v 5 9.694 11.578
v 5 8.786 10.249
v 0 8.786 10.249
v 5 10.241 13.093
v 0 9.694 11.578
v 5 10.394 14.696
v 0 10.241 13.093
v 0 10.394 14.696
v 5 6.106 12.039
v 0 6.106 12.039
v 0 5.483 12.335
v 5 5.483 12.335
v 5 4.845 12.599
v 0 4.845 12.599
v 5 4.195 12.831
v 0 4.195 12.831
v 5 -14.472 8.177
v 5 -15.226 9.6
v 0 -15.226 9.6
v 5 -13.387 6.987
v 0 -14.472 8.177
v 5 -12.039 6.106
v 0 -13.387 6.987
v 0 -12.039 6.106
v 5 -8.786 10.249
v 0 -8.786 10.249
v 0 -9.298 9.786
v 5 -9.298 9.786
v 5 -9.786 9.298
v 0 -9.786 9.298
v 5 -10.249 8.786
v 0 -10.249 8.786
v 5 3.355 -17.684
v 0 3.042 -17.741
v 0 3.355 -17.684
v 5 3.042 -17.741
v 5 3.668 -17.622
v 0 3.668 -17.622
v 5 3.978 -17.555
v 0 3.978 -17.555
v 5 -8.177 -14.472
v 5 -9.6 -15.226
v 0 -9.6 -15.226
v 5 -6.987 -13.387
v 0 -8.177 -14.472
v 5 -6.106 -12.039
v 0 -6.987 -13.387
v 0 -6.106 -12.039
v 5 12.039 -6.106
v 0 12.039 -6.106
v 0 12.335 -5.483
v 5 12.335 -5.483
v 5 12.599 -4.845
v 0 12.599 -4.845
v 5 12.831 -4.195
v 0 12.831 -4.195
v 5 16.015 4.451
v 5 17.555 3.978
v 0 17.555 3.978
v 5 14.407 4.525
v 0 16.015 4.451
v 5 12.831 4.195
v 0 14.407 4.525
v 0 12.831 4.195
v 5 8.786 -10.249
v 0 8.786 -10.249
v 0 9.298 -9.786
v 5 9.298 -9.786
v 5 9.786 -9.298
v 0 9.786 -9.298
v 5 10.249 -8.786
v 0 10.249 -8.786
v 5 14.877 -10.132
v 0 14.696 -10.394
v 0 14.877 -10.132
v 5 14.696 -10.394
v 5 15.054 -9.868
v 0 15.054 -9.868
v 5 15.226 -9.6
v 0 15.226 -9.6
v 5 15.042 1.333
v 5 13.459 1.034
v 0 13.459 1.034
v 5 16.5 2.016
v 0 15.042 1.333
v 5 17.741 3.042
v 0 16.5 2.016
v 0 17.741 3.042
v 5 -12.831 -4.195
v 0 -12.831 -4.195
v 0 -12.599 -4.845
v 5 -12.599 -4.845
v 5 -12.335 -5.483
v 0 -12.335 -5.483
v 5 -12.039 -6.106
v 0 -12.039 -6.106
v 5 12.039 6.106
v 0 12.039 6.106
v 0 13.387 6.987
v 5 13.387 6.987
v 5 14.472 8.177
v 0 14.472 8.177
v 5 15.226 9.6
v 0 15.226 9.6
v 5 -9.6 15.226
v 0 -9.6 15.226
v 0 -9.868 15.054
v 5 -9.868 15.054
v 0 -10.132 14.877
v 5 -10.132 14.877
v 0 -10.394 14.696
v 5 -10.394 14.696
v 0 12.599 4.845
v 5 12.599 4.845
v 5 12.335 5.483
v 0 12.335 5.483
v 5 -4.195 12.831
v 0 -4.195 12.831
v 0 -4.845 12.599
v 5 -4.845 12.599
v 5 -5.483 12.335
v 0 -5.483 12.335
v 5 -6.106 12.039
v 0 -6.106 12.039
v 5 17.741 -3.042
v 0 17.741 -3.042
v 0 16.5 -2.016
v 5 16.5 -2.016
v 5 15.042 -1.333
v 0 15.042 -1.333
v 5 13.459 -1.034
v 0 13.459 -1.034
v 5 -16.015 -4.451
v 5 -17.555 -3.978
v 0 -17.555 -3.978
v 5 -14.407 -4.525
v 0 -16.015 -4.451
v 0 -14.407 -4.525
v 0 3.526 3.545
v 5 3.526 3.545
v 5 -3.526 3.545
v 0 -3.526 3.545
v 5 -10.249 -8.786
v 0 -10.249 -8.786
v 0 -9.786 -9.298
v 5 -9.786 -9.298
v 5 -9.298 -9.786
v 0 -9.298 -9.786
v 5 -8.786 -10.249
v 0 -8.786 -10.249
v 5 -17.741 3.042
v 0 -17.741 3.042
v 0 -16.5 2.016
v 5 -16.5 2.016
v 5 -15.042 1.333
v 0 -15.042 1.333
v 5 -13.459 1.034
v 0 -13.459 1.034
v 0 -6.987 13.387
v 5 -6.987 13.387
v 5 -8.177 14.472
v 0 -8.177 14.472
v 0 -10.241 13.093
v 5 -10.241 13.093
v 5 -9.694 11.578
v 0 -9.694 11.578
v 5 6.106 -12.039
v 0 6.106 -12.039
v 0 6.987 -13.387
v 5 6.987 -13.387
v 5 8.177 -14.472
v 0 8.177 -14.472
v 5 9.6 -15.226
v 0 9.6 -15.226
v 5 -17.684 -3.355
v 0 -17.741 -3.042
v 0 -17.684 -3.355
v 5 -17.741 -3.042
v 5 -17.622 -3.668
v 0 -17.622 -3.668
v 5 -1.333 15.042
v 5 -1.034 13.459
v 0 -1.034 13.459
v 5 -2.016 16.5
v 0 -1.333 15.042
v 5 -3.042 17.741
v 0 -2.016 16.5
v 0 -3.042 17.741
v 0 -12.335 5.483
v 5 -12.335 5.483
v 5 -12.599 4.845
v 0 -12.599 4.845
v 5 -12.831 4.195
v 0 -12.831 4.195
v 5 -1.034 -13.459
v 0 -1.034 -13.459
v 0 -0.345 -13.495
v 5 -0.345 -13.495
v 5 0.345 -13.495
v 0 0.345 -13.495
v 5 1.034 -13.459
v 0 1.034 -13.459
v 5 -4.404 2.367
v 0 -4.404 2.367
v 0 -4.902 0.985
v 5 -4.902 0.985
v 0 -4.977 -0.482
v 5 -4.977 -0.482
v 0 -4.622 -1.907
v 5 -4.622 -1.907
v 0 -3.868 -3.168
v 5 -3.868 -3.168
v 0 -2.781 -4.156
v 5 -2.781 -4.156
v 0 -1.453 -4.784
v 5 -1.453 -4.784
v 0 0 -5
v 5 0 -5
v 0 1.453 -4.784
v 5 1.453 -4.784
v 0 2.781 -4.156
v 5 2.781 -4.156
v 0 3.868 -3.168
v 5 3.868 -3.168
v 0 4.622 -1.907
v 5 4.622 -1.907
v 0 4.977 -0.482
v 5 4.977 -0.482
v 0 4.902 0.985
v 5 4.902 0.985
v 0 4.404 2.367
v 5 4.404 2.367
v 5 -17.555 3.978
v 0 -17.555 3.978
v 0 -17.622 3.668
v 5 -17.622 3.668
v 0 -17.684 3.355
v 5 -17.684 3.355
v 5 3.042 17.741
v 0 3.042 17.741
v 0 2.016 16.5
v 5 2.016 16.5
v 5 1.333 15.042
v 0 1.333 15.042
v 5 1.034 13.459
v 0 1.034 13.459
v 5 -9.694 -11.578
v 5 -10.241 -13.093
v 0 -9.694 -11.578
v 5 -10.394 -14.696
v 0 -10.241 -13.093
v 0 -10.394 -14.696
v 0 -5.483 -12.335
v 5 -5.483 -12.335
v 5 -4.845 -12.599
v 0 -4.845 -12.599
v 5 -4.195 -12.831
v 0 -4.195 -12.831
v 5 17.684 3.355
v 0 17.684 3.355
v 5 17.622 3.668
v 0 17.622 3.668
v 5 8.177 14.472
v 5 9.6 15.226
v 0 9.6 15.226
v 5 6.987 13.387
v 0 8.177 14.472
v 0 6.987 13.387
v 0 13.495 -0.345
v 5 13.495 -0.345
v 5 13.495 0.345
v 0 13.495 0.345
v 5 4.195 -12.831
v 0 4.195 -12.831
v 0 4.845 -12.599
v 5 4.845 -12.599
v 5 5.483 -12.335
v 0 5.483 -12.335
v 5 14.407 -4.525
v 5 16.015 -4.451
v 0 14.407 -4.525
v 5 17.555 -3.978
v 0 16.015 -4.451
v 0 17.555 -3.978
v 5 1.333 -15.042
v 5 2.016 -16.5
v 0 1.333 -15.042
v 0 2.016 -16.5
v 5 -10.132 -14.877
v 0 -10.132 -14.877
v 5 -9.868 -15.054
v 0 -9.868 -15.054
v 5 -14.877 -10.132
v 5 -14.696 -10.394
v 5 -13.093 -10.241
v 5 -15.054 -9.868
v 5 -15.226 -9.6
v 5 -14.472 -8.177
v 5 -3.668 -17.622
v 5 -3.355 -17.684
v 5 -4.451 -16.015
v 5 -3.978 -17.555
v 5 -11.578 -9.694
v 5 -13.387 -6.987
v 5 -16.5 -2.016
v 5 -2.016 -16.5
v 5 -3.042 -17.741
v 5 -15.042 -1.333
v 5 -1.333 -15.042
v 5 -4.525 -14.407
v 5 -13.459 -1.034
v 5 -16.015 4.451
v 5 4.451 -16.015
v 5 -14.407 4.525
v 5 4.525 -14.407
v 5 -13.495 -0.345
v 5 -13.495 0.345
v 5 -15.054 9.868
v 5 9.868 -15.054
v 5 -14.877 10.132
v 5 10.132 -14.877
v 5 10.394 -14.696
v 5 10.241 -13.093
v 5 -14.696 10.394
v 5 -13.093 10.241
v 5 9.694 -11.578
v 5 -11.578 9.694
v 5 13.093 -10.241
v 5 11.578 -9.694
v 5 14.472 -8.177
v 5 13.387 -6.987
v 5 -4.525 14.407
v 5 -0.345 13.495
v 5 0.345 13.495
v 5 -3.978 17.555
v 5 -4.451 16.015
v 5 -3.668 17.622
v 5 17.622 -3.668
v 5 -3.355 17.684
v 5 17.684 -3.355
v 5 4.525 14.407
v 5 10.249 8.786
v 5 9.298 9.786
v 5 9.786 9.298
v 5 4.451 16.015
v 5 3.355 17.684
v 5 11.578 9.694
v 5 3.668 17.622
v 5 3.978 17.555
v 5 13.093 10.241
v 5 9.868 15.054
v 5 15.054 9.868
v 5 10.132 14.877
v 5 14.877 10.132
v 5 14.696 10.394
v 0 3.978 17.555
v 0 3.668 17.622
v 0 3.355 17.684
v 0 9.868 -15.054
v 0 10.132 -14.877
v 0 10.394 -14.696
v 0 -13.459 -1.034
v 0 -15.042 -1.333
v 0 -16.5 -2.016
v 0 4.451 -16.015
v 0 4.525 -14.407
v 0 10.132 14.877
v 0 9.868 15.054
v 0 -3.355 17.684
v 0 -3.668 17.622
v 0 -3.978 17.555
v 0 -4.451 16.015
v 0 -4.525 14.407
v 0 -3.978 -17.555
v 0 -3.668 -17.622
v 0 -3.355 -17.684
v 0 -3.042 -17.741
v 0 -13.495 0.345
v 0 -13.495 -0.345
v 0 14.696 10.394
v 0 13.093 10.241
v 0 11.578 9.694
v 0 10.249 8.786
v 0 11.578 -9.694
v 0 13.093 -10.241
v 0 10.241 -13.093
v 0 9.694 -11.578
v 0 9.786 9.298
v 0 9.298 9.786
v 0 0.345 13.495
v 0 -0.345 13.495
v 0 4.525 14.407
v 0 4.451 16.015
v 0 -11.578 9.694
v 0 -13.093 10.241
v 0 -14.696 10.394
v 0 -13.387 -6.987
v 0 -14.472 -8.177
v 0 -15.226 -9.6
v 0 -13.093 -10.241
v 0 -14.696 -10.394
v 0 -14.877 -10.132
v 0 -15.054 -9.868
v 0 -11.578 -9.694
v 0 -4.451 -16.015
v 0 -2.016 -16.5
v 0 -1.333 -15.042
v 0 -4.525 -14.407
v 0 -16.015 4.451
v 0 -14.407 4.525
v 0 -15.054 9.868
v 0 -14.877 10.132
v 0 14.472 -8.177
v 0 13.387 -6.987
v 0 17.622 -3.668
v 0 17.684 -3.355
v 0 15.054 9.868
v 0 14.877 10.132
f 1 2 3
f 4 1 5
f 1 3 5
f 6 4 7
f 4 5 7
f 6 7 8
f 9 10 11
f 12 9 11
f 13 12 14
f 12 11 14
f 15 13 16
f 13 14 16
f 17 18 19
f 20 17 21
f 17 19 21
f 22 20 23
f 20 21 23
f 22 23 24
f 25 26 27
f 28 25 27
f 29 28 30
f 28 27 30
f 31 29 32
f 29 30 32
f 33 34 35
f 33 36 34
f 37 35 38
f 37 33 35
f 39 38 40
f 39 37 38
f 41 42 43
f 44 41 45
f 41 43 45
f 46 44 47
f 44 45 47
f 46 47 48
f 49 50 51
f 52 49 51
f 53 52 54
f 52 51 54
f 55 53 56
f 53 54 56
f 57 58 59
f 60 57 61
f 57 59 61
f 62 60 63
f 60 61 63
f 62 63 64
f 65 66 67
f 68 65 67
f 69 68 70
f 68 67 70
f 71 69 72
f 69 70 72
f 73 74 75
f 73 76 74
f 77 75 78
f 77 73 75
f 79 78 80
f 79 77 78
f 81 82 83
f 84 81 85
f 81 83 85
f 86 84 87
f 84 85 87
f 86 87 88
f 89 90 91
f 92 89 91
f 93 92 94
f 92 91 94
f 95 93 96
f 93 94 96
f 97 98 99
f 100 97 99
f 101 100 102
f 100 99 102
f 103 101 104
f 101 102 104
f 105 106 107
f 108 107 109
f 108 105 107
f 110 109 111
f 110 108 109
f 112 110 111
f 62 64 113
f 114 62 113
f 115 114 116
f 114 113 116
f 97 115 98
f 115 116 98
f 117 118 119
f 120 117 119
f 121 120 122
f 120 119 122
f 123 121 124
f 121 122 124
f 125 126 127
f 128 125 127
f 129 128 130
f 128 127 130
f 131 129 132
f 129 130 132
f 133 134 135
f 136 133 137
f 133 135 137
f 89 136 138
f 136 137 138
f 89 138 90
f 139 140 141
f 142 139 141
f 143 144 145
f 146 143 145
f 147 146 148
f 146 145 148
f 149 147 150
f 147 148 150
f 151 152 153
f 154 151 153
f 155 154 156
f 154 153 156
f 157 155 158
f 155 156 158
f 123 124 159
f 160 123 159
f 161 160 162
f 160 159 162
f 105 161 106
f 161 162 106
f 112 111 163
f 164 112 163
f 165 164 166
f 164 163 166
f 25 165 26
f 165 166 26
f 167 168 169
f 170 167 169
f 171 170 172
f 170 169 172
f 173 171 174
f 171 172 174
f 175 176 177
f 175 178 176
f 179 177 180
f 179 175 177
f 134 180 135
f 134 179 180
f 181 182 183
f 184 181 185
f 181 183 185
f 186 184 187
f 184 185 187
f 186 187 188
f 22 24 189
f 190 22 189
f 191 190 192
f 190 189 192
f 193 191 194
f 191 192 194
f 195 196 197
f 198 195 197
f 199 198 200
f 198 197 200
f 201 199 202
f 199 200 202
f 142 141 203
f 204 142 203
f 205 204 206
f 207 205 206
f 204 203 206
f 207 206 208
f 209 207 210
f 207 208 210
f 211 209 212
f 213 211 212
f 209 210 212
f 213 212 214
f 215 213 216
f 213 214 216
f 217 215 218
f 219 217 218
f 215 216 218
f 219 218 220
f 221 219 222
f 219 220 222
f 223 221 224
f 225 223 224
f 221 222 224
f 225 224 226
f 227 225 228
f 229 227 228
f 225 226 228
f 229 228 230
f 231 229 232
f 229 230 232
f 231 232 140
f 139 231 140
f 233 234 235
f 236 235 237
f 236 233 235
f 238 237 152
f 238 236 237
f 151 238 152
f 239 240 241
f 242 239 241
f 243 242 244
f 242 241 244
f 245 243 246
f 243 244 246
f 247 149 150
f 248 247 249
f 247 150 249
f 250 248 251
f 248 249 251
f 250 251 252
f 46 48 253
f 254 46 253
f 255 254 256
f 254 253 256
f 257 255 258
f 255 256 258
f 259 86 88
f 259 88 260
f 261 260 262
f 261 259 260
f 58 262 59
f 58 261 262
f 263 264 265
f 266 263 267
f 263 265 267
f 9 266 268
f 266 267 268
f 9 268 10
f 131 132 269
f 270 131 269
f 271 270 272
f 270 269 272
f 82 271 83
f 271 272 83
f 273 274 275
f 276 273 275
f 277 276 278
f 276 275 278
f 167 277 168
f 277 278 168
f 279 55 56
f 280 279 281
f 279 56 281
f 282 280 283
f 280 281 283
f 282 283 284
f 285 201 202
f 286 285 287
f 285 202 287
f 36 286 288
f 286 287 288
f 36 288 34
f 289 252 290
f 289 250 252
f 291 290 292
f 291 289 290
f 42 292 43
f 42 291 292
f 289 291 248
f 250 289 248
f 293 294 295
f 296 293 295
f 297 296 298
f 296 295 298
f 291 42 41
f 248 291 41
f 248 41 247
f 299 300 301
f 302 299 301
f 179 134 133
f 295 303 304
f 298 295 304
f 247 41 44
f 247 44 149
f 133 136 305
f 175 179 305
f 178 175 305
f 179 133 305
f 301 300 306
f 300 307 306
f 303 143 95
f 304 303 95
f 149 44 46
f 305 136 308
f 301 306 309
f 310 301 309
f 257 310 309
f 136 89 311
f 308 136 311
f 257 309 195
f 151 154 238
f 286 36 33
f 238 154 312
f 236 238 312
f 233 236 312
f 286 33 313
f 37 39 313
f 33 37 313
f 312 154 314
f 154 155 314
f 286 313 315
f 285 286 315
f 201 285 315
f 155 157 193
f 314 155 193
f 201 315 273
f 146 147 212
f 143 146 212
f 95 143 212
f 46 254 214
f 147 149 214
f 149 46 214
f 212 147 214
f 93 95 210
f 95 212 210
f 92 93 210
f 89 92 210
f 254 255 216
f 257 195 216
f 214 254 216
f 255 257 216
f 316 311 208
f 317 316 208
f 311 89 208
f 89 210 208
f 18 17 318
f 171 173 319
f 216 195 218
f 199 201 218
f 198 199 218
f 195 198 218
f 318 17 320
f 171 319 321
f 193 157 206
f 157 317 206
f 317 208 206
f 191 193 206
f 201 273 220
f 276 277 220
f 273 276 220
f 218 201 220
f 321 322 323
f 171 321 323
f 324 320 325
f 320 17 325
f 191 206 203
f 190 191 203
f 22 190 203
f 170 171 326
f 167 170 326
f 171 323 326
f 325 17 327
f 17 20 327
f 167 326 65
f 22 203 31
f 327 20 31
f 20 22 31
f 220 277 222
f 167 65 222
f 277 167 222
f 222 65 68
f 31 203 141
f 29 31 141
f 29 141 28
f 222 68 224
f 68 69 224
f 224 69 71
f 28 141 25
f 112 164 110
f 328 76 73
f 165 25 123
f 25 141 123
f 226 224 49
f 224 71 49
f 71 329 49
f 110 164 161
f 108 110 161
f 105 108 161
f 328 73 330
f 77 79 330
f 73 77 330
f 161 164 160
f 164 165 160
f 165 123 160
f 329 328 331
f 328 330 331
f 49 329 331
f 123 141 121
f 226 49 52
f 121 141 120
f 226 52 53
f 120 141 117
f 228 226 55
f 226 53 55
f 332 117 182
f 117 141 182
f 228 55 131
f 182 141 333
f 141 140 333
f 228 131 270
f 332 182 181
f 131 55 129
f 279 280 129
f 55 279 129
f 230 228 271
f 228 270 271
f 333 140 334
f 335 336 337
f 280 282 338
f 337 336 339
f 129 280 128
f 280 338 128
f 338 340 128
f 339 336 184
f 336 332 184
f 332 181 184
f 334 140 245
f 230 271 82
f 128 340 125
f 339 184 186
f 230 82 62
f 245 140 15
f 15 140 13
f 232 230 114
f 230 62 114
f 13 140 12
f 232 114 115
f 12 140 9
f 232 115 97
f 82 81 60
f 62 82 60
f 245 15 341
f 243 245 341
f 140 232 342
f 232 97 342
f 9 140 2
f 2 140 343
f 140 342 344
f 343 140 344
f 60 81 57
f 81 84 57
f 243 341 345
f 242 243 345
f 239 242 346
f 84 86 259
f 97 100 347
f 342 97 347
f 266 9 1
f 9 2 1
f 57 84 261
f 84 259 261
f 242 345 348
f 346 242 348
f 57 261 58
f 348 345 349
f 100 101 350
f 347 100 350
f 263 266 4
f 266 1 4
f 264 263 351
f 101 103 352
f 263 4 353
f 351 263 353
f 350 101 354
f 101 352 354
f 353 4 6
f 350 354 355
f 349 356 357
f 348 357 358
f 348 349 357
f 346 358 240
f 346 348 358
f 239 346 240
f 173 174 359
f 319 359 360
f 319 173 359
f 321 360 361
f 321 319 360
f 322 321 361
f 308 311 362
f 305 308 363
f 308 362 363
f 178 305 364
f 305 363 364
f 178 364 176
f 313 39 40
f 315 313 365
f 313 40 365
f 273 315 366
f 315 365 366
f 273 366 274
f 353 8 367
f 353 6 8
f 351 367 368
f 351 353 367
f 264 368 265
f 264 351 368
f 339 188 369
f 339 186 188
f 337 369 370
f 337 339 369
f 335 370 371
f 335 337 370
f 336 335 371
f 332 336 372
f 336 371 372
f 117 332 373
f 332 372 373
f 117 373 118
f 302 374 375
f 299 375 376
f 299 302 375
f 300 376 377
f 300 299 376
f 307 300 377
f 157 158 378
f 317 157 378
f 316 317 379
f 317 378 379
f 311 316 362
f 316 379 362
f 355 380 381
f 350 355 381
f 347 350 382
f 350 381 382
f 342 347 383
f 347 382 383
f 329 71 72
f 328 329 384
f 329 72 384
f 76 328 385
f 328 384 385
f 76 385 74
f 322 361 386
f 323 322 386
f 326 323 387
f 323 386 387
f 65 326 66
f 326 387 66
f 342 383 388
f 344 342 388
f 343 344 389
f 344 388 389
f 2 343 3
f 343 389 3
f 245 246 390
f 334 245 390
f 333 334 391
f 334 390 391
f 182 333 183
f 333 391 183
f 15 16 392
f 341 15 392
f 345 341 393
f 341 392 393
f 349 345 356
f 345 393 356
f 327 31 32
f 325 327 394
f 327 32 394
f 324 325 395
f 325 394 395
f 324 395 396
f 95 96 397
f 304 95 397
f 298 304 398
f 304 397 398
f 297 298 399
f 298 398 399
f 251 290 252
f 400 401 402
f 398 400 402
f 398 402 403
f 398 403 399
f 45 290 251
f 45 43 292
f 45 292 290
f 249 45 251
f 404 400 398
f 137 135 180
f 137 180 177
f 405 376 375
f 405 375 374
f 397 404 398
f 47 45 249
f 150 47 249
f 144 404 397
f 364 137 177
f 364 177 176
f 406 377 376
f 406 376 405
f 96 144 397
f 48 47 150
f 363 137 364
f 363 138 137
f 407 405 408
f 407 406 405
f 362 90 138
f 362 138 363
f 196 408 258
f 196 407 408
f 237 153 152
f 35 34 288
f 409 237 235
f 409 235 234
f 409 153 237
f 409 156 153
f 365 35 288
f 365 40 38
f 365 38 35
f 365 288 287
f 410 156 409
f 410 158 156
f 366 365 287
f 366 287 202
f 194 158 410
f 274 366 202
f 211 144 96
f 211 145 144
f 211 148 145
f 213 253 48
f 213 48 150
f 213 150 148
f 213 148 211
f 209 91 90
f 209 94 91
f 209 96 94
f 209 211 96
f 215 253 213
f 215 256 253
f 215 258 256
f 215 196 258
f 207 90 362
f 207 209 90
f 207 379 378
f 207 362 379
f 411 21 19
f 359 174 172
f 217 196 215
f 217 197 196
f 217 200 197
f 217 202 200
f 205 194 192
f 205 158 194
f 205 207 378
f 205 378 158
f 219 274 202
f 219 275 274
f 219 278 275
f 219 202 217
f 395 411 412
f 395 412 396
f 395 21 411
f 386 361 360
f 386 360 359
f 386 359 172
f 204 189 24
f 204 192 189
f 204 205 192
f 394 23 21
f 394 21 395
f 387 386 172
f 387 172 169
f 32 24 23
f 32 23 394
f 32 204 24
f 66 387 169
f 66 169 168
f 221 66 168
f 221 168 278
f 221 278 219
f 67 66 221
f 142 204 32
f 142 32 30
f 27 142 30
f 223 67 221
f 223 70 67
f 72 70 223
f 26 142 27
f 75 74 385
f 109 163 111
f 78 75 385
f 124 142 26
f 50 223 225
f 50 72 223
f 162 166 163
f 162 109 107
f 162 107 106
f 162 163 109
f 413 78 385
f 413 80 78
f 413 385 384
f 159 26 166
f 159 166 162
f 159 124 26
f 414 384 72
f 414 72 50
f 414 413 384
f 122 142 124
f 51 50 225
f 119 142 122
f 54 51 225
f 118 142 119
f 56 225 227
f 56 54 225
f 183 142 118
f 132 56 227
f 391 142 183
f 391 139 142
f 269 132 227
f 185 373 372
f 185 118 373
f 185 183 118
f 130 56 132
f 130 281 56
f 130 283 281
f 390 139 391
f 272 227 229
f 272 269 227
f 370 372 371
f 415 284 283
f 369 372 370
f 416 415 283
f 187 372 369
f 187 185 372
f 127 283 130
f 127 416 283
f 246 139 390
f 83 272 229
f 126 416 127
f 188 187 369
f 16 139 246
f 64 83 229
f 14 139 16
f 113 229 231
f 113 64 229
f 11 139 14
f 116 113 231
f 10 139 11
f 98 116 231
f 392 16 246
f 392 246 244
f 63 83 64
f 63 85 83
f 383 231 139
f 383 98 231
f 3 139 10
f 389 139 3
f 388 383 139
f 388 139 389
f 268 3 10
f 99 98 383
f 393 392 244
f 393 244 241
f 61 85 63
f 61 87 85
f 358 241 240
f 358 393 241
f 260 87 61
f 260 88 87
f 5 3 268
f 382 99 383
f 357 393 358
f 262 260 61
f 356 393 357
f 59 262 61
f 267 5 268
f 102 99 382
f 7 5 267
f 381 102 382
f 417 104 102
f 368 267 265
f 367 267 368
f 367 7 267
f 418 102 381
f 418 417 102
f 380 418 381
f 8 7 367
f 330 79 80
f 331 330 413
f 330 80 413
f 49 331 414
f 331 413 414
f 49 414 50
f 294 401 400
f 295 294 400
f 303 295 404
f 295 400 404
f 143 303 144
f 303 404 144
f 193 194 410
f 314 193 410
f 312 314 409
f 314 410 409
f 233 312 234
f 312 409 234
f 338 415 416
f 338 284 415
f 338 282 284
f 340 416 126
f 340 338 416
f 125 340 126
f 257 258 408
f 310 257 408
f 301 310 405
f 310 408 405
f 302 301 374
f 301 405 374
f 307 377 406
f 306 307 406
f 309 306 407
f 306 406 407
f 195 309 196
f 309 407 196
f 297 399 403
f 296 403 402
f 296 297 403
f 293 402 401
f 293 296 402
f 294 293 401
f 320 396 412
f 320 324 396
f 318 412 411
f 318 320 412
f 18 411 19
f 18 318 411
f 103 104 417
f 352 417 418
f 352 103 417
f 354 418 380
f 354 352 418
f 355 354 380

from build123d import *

# Parameters (mm, degrees)
BASPROSKE_W     = 5
BASPROSKE_H     = 18
TOOTHCUT_DEPTH  = 26.942243542
TEETHCUTS_COUNT = 16
TEETHCUTS_ANGLE = 337.5
BORSKE_R        = 5
BORE_DEPTH      = 50.0000508
EXTRUDE_START   = -5
EXTRUDE_1_DEPTH = 5


with BuildPart() as part:
    # BasProSke → Base-Revolve (revolve)
    with BuildSketch(Plane(origin=(0, 0, 0), x_dir=(1, 0, 0), z_dir=(0, 1, 0)), mode=Mode.PRIVATE) as base_revolve_sk:
        with Locations((2.5, 9)):
            Rectangle(BASPROSKE_W, BASPROSKE_H)
    revolve(base_revolve_sk.sketch.rotate(Axis((-10, 0, 0), (1, 0, 0)), 180), axis=Axis((-10, 0, 0), (1, 0, 0)))

    # TooCutSke → ToothCut (cut, through all)
    with BuildSketch(Plane(origin=(0, 0, 0), x_dir=(0, 0, -1), z_dir=(1, 0, 0))):
        with BuildLine():
            ThreePointArc((1.03434411, 13.459313997), (0, 13.499), (-1.03434411, 13.459313997))
            ThreePointArc((-1.03434411, 13.459313997), (-1.635143665, 15.806872195), (-3.065655864, 17.762792553))
            ThreePointArc((-3.065655864, 17.762792553), (0, 18.0254), (3.065655864, 17.762792553))
            ThreePointArc((3.065655864, 17.762792553), (1.635143665, 15.806872195), (1.03434411, 13.459313997))
        make_face()
    toothcut = extrude(amount=TOOTHCUT_DEPTH, mode=Mode.SUBTRACT)

    # TeethCuts: ToothCut ×16 about axis
    teethcuts_axis = Axis((-10, 0, 0), (1, 0, 0))
    for i in range(1, TEETHCUTS_COUNT):
        add(toothcut.rotate(teethcuts_axis, i * TEETHCUTS_ANGLE / (TEETHCUTS_COUNT - 1)), mode=Mode.SUBTRACT)

    # BorSke → Bore (cut, symmetric)
    with BuildSketch(Plane(origin=(0, 0, 0), x_dir=(0, 0, -1), z_dir=(1, 0, 0))):
        with Locations(Location((0, 0, 0), (0, 0, 180))):
            Circle(BORSKE_R)
    extrude(amount=BORE_DEPTH, both=True, mode=Mode.SUBTRACT)

    # 草图2 → 凸台-拉伸1 (add)
    with BuildSketch(Plane.ZY.offset(EXTRUDE_START)):
        with BuildLine():
            Line((3.544820497, 3.526222858), (3.544820497, -3.526222858))
            ThreePointArc((3.544820497, -3.526222858), (5, 0), (3.544820497, 3.526222858))
        make_face()
    extrude(amount=EXTRUDE_1_DEPTH)


solid = part.part
